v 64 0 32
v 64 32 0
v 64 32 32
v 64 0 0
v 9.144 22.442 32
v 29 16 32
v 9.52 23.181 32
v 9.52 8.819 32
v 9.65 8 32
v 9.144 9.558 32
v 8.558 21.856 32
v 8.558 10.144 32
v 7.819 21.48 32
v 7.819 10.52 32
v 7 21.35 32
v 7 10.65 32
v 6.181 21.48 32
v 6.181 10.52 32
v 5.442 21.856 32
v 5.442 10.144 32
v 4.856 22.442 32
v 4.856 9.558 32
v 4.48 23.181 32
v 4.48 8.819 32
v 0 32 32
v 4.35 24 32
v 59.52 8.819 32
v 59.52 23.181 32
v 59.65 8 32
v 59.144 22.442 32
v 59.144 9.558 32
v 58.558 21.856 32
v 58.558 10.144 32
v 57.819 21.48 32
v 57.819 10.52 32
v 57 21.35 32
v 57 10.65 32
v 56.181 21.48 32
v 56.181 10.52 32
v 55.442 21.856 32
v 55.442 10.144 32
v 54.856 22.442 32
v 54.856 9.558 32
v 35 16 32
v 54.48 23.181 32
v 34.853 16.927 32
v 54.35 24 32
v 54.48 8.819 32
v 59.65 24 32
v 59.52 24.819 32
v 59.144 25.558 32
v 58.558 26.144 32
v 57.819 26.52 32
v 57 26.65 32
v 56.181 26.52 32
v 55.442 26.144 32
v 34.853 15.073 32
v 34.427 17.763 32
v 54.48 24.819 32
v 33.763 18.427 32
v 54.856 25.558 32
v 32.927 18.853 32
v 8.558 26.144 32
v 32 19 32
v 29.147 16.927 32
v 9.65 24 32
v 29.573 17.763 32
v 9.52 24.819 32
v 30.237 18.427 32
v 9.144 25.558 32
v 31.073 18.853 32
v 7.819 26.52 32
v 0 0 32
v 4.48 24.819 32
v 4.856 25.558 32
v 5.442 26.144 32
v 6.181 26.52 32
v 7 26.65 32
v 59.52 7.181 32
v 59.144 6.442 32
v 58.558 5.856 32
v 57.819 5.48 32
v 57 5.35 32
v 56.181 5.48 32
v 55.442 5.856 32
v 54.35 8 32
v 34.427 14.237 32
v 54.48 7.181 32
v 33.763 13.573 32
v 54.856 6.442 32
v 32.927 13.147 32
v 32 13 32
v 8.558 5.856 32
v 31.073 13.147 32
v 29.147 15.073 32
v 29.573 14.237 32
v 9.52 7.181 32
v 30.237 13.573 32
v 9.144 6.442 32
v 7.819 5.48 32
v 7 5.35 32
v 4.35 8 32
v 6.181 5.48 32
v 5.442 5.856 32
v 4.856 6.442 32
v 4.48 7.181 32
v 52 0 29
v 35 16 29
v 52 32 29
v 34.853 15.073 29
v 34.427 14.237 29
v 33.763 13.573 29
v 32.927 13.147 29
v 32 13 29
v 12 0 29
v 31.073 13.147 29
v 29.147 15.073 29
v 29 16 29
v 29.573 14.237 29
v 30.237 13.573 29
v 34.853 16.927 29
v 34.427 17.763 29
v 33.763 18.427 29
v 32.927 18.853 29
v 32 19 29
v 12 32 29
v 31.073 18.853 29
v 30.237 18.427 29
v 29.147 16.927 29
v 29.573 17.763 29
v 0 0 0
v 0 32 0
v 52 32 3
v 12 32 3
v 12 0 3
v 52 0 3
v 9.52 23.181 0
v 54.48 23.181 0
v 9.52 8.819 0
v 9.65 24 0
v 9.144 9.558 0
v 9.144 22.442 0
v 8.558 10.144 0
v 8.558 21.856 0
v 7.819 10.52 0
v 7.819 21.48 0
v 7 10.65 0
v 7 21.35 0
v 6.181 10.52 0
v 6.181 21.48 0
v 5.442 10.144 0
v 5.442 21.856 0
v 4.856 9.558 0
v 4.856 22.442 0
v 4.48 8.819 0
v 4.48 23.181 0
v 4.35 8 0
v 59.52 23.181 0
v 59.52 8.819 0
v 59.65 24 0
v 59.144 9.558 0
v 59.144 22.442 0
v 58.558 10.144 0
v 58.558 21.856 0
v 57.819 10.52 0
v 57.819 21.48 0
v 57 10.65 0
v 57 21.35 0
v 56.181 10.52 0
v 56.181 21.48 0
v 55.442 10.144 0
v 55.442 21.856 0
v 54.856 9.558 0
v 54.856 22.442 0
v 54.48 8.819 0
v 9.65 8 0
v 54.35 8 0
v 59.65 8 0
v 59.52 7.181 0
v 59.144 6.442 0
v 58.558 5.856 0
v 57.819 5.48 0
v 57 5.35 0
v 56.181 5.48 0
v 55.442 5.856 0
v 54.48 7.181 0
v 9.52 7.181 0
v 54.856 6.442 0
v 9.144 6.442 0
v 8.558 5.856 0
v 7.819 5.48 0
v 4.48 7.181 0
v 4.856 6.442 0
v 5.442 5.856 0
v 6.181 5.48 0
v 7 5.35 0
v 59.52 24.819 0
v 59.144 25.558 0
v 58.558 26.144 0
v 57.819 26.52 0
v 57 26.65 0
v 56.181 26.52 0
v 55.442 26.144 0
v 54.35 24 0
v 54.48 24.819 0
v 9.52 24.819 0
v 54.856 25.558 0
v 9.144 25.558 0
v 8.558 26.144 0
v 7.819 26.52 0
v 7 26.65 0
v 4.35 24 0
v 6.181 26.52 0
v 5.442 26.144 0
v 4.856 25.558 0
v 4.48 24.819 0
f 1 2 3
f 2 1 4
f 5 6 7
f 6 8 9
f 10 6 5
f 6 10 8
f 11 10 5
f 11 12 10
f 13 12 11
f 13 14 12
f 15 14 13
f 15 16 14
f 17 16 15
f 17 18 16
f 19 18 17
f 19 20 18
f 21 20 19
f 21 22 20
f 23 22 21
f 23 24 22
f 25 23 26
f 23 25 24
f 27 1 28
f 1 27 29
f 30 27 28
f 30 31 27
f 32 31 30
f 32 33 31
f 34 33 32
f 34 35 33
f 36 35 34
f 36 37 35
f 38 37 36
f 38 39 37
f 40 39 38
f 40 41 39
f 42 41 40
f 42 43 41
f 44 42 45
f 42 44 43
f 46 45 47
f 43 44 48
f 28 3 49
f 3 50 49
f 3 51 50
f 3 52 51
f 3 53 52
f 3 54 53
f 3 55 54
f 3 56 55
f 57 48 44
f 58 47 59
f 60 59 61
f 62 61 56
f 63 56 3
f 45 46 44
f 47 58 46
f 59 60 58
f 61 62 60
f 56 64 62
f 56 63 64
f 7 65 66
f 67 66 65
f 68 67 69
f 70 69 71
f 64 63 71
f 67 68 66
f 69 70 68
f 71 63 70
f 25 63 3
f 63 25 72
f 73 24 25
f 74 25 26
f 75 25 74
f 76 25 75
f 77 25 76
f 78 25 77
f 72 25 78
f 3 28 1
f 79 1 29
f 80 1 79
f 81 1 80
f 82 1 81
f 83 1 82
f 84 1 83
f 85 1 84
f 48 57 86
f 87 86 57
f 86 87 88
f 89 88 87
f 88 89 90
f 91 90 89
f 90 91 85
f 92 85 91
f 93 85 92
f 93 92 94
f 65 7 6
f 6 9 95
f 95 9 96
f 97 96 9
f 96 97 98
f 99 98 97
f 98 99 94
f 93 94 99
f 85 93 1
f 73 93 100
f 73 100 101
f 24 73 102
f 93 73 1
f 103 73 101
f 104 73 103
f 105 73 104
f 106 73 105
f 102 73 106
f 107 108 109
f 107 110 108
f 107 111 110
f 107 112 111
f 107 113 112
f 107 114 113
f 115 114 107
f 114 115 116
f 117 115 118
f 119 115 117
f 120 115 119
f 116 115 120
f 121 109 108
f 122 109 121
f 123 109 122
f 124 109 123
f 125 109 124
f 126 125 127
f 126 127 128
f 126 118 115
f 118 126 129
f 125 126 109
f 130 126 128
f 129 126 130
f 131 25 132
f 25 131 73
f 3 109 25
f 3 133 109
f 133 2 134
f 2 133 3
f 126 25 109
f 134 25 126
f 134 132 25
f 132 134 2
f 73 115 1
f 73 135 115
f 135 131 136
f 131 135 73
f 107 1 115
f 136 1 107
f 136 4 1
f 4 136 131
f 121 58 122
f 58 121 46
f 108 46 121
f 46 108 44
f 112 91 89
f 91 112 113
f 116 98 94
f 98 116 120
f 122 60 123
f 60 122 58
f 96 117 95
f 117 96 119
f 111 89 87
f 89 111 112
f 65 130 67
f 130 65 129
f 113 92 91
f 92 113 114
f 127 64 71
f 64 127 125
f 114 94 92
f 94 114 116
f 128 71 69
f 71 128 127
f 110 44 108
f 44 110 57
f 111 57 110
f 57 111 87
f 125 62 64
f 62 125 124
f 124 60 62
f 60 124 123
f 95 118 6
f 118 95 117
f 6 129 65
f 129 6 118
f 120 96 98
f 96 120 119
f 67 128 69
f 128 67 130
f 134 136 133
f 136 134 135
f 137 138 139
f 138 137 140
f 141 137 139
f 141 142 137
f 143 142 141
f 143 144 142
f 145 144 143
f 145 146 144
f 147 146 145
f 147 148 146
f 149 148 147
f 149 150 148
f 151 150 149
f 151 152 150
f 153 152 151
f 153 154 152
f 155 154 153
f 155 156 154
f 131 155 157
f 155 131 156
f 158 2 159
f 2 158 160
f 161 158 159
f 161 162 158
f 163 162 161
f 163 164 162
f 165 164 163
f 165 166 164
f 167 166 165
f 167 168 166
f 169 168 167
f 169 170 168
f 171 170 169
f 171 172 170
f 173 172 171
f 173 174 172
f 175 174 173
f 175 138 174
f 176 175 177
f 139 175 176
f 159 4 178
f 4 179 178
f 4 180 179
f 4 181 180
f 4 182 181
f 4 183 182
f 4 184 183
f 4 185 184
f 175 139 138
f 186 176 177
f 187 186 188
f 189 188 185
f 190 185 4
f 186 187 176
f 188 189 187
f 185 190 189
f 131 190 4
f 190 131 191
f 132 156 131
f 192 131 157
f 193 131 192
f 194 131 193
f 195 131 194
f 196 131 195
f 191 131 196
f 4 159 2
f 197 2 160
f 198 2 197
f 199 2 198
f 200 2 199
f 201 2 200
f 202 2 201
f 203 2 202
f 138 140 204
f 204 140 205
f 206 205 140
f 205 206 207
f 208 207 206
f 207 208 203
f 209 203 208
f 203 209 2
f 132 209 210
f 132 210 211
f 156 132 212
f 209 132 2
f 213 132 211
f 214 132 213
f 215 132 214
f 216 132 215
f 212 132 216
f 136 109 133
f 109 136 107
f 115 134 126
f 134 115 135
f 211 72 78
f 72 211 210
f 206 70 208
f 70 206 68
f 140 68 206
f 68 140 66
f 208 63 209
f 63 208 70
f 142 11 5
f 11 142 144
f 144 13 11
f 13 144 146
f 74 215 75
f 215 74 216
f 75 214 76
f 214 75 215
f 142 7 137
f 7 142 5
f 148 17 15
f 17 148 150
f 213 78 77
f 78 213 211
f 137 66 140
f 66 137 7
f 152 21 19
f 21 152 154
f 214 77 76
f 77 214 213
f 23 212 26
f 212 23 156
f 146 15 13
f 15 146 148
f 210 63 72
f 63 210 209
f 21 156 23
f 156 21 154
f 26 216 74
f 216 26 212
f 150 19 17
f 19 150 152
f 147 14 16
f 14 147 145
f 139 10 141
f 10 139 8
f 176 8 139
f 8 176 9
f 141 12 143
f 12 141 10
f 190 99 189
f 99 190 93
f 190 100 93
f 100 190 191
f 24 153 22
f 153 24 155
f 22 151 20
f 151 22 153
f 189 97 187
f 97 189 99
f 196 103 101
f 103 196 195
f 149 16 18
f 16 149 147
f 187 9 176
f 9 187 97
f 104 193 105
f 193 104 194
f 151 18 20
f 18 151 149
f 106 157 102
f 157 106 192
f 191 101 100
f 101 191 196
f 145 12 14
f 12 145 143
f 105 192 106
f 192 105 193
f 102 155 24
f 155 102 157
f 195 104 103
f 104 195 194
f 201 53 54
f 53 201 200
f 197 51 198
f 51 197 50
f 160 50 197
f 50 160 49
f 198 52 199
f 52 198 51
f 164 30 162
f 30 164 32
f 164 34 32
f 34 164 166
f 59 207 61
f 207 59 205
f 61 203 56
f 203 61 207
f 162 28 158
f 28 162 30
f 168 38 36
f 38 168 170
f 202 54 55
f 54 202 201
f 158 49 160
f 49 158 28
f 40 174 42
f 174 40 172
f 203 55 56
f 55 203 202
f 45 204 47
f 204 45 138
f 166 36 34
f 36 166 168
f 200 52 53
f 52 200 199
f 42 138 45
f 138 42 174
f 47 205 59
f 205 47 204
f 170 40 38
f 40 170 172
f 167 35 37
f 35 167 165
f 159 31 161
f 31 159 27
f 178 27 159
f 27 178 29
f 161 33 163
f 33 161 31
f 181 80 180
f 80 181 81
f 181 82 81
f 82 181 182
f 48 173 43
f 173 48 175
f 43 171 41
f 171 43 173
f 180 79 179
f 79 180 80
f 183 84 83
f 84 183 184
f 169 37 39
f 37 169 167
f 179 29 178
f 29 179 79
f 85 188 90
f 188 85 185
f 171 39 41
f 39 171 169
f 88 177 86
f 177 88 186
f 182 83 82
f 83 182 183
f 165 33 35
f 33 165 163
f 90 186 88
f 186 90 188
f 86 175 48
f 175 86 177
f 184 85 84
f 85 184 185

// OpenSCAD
// file: common.scad
//GLOBAL VALUES


ear_outer=32; // Outer diameter of each ear
ear_inner=5; // hole for each ear M5

mounting_gap = 6.9; // gap between two ears to mount the light



ear_thick=8;

stacked_len = ear_thick*3;
screw_mount_space = 20;
screw_mount_offset =7;
total_len = stacked_len + screw_mount_space*2;
mounting_diff = 8;

//M3 fastener values

m3_nut_trap_d = 6.7;
m3_nut_thick= 2.4;

m3_bolt_head_d = 5.6;
m3_bolt_thick = 3;

//M5 fastener values

m5_nut_thick = 4;
m5_locknut_thick = 5;
nut_trap_d = 9.7;
bolt_head_d = 8.6;



module bolt_nut(hole_len, bolt_d, flip=false){
    /*
        Create a model for a hole with bolt end on one end and nut hole on the other end.
    Note, this functions doesn't subtract the model it only makes the model
    */
    // currently only implemented for 3mm
    if (flip){
        hole_w_end(hole_len, m3_nut_thick, "hex", bolt_d);
        translate([0,0, hole_len]){
            rotate([180, 0, 0]){
                hole_w_end(hole_len, m3_bolt_thick, "round", bolt_d);
            }
        }
    } else {
        hole_w_end(hole_len, m3_bolt_thick, "round", bolt_d);
        translate([0,0, hole_len]){
            rotate([180, 0, 0]){
                hole_w_end(hole_len, m3_nut_thick, "hex", bolt_d);
            }
        }
    }
}

// More generic functions replacing m5_ hole-making functions
module hole_w_end(hole_len, trap_height, type, bolt_d, flip=false){
    /*
       bolt_d - bolt diameter, i.e. 3, 5 mm
        type -- type of the head hole: 'none', 'hex', 'round
    */
    if (type != "none"){
        cylinder(h=hole_len-trap_height, d=bolt_d, $fn=20);
        if (flip){
            m_recess(trap_height, type, bolt_d);
            translate([0,0,trap_height])
                cylinder(h=hole_len-trap_height, d=bolt_d, $fn=20);

        } else {
                translate([0,0, hole_len - trap_height])
                    m_recess(trap_height, type, bolt_d);
        }
    } else {
        cylinder(h=hole_len, d=bolt_d);
    }
}

module m_recess(height, end_type, bolt_d) {
    // nut/bolt capture hole
    /*
       bolt_d - bolt diameter, i.e. 3, 5 mm
        type -- type of the head hole: 'none', 'hex', 'round
    */
    if (bolt_d >= 3 && bolt_d <= 4){
        //M3
        make_recess(height, end_type, m3_nut_trap_d);
    } else if (bolt_d >= 5 && bolt_d <= 6){
        // M5
        make_recess(height, end_type, nut_trap_d);
    }

}

module make_recess(height, end_type, trap_d){
    rotate([0, 0,90]){
        if (end_type == "hex"){
            cylinder(h=height, d=trap_d, $fn=6);
        } else if (end_type == "round"){
            cylinder(h=height, d=trap_d, $fn=20);
        }
    }
}


//Functions specific to M5 size,
// TODO rewrite as hole_w_end m_recess
module m5_recess(height, end_type) {
    // nut/bolt capture hole
    rotate([0, 0,90]){
        if (end_type == "hex"){
            cylinder(h=height, d=nut_trap_d, $fn=6);
        } else if (end_type == "round"){
            cylinder(h=height, d=nut_trap_d, $fn=20);
        }
    }
}



module m5_hole_w_end(hole_len, trap_height, type){
    //Given hole lenght and trap height create a nut trap hole
    if (type != "none"){
        cylinder(h=hole_len-trap_height, d=5.3, $fn=20); // M5 hole;
            translate([0,0, hole_len-trap_height])
                m5_recess(trap_height, type);
    } else {
        cylinder(h=hole_len, d=5.3); // M5 hole;
    }
}
module m5_hole_w_ends(hole_len, nut_extra=0){
    m5_hole_w_end(hole_len, m5_nut_thick, "round");
    rotate([0, 180, 0])
        translate([0, 0, - hole_len])
            m5_hole_w_end(hole_len, m5_nut_thick + nut_extra, "hex");

}
module set_mounting_hole(x_offset, y_offset, thickness, nut_height, end_type, flip=false){
    /*
    end_type -- end types: - hex, round, none
    */
    translate([x_offset, y_offset, 0]){
        hole_w_end(thickness, nut_height, end_type, 5.3, flip);
    }
}



module mounting_holes_2(fastener_len, nut_height, end_type){
    width_offsetn = 16;
    set_mounting_hole(
        screw_mount_offset,
        width_offset + mounting_diff,
        fastener_len,
        nut_height,
        end_type);

    set_mounting_hole(
        total_len - screw_mount_offset,
        width_offset + mounting_diff,
        fastener_len,
        nut_height,
        end_type);


 }

module mounting_holes(fastener_len, nut_height, end_type, flip=false){
    width_offset = 16;
    // Side towards the beginning
    set_mounting_hole(
        screw_mount_offset,
        width_offset + mounting_diff,
        fastener_len,
        nut_height,
        end_type,
        flip);

    set_mounting_hole(
        screw_mount_offset,
        width_offset - mounting_diff,
        fastener_len,
        nut_height,
        end_type,
        flip);

    // Side towards the end
    set_mounting_hole(
        total_len - screw_mount_offset,
        width_offset + mounting_diff,
        fastener_len,
        nut_height,
        end_type,
        flip);

    set_mounting_hole(
        total_len - screw_mount_offset,
        width_offset - mounting_diff,
        fastener_len,
        nut_height,
        end_type,
        flip);
}
// main file
include <common.scad>;

$fn = 20;
//This whole thing should be 33 mm tall

//Diameter of a  4-20 hole
d_4_20 = 6;

cube_height = 32;
screw_mount_thickness = 12;

module mounting_base(base_thick, ){
    cube([total_len, ear_outer, base_thick]);
    //farther side column
    translate([total_len, 0, 0])
    rotate([0, 270, 0])
        cube([cube_height, ear_outer, screw_mount_thickness]);
    // closer side column
    translate([screw_mount_thickness, 0, 0])
    rotate([0, 270, 0])
        cube([cube_height, ear_outer, screw_mount_thickness]);
    //top panel with the hole 
    // TODO: move this into a separate func
    translate([0,0,cube_height-base_thick])
        difference(){
            cube([total_len, ear_outer, base_thick]);
            // move to the middle
            translate([total_len/2, ear_outer/2])
                cylinder(h=base_thick, d=d_4_20, $fn=20);
        }
    
}
base_thick = 3;

difference(){
    mounting_base(base_thick);
    mounting_holes(50, 0, "none");
}
